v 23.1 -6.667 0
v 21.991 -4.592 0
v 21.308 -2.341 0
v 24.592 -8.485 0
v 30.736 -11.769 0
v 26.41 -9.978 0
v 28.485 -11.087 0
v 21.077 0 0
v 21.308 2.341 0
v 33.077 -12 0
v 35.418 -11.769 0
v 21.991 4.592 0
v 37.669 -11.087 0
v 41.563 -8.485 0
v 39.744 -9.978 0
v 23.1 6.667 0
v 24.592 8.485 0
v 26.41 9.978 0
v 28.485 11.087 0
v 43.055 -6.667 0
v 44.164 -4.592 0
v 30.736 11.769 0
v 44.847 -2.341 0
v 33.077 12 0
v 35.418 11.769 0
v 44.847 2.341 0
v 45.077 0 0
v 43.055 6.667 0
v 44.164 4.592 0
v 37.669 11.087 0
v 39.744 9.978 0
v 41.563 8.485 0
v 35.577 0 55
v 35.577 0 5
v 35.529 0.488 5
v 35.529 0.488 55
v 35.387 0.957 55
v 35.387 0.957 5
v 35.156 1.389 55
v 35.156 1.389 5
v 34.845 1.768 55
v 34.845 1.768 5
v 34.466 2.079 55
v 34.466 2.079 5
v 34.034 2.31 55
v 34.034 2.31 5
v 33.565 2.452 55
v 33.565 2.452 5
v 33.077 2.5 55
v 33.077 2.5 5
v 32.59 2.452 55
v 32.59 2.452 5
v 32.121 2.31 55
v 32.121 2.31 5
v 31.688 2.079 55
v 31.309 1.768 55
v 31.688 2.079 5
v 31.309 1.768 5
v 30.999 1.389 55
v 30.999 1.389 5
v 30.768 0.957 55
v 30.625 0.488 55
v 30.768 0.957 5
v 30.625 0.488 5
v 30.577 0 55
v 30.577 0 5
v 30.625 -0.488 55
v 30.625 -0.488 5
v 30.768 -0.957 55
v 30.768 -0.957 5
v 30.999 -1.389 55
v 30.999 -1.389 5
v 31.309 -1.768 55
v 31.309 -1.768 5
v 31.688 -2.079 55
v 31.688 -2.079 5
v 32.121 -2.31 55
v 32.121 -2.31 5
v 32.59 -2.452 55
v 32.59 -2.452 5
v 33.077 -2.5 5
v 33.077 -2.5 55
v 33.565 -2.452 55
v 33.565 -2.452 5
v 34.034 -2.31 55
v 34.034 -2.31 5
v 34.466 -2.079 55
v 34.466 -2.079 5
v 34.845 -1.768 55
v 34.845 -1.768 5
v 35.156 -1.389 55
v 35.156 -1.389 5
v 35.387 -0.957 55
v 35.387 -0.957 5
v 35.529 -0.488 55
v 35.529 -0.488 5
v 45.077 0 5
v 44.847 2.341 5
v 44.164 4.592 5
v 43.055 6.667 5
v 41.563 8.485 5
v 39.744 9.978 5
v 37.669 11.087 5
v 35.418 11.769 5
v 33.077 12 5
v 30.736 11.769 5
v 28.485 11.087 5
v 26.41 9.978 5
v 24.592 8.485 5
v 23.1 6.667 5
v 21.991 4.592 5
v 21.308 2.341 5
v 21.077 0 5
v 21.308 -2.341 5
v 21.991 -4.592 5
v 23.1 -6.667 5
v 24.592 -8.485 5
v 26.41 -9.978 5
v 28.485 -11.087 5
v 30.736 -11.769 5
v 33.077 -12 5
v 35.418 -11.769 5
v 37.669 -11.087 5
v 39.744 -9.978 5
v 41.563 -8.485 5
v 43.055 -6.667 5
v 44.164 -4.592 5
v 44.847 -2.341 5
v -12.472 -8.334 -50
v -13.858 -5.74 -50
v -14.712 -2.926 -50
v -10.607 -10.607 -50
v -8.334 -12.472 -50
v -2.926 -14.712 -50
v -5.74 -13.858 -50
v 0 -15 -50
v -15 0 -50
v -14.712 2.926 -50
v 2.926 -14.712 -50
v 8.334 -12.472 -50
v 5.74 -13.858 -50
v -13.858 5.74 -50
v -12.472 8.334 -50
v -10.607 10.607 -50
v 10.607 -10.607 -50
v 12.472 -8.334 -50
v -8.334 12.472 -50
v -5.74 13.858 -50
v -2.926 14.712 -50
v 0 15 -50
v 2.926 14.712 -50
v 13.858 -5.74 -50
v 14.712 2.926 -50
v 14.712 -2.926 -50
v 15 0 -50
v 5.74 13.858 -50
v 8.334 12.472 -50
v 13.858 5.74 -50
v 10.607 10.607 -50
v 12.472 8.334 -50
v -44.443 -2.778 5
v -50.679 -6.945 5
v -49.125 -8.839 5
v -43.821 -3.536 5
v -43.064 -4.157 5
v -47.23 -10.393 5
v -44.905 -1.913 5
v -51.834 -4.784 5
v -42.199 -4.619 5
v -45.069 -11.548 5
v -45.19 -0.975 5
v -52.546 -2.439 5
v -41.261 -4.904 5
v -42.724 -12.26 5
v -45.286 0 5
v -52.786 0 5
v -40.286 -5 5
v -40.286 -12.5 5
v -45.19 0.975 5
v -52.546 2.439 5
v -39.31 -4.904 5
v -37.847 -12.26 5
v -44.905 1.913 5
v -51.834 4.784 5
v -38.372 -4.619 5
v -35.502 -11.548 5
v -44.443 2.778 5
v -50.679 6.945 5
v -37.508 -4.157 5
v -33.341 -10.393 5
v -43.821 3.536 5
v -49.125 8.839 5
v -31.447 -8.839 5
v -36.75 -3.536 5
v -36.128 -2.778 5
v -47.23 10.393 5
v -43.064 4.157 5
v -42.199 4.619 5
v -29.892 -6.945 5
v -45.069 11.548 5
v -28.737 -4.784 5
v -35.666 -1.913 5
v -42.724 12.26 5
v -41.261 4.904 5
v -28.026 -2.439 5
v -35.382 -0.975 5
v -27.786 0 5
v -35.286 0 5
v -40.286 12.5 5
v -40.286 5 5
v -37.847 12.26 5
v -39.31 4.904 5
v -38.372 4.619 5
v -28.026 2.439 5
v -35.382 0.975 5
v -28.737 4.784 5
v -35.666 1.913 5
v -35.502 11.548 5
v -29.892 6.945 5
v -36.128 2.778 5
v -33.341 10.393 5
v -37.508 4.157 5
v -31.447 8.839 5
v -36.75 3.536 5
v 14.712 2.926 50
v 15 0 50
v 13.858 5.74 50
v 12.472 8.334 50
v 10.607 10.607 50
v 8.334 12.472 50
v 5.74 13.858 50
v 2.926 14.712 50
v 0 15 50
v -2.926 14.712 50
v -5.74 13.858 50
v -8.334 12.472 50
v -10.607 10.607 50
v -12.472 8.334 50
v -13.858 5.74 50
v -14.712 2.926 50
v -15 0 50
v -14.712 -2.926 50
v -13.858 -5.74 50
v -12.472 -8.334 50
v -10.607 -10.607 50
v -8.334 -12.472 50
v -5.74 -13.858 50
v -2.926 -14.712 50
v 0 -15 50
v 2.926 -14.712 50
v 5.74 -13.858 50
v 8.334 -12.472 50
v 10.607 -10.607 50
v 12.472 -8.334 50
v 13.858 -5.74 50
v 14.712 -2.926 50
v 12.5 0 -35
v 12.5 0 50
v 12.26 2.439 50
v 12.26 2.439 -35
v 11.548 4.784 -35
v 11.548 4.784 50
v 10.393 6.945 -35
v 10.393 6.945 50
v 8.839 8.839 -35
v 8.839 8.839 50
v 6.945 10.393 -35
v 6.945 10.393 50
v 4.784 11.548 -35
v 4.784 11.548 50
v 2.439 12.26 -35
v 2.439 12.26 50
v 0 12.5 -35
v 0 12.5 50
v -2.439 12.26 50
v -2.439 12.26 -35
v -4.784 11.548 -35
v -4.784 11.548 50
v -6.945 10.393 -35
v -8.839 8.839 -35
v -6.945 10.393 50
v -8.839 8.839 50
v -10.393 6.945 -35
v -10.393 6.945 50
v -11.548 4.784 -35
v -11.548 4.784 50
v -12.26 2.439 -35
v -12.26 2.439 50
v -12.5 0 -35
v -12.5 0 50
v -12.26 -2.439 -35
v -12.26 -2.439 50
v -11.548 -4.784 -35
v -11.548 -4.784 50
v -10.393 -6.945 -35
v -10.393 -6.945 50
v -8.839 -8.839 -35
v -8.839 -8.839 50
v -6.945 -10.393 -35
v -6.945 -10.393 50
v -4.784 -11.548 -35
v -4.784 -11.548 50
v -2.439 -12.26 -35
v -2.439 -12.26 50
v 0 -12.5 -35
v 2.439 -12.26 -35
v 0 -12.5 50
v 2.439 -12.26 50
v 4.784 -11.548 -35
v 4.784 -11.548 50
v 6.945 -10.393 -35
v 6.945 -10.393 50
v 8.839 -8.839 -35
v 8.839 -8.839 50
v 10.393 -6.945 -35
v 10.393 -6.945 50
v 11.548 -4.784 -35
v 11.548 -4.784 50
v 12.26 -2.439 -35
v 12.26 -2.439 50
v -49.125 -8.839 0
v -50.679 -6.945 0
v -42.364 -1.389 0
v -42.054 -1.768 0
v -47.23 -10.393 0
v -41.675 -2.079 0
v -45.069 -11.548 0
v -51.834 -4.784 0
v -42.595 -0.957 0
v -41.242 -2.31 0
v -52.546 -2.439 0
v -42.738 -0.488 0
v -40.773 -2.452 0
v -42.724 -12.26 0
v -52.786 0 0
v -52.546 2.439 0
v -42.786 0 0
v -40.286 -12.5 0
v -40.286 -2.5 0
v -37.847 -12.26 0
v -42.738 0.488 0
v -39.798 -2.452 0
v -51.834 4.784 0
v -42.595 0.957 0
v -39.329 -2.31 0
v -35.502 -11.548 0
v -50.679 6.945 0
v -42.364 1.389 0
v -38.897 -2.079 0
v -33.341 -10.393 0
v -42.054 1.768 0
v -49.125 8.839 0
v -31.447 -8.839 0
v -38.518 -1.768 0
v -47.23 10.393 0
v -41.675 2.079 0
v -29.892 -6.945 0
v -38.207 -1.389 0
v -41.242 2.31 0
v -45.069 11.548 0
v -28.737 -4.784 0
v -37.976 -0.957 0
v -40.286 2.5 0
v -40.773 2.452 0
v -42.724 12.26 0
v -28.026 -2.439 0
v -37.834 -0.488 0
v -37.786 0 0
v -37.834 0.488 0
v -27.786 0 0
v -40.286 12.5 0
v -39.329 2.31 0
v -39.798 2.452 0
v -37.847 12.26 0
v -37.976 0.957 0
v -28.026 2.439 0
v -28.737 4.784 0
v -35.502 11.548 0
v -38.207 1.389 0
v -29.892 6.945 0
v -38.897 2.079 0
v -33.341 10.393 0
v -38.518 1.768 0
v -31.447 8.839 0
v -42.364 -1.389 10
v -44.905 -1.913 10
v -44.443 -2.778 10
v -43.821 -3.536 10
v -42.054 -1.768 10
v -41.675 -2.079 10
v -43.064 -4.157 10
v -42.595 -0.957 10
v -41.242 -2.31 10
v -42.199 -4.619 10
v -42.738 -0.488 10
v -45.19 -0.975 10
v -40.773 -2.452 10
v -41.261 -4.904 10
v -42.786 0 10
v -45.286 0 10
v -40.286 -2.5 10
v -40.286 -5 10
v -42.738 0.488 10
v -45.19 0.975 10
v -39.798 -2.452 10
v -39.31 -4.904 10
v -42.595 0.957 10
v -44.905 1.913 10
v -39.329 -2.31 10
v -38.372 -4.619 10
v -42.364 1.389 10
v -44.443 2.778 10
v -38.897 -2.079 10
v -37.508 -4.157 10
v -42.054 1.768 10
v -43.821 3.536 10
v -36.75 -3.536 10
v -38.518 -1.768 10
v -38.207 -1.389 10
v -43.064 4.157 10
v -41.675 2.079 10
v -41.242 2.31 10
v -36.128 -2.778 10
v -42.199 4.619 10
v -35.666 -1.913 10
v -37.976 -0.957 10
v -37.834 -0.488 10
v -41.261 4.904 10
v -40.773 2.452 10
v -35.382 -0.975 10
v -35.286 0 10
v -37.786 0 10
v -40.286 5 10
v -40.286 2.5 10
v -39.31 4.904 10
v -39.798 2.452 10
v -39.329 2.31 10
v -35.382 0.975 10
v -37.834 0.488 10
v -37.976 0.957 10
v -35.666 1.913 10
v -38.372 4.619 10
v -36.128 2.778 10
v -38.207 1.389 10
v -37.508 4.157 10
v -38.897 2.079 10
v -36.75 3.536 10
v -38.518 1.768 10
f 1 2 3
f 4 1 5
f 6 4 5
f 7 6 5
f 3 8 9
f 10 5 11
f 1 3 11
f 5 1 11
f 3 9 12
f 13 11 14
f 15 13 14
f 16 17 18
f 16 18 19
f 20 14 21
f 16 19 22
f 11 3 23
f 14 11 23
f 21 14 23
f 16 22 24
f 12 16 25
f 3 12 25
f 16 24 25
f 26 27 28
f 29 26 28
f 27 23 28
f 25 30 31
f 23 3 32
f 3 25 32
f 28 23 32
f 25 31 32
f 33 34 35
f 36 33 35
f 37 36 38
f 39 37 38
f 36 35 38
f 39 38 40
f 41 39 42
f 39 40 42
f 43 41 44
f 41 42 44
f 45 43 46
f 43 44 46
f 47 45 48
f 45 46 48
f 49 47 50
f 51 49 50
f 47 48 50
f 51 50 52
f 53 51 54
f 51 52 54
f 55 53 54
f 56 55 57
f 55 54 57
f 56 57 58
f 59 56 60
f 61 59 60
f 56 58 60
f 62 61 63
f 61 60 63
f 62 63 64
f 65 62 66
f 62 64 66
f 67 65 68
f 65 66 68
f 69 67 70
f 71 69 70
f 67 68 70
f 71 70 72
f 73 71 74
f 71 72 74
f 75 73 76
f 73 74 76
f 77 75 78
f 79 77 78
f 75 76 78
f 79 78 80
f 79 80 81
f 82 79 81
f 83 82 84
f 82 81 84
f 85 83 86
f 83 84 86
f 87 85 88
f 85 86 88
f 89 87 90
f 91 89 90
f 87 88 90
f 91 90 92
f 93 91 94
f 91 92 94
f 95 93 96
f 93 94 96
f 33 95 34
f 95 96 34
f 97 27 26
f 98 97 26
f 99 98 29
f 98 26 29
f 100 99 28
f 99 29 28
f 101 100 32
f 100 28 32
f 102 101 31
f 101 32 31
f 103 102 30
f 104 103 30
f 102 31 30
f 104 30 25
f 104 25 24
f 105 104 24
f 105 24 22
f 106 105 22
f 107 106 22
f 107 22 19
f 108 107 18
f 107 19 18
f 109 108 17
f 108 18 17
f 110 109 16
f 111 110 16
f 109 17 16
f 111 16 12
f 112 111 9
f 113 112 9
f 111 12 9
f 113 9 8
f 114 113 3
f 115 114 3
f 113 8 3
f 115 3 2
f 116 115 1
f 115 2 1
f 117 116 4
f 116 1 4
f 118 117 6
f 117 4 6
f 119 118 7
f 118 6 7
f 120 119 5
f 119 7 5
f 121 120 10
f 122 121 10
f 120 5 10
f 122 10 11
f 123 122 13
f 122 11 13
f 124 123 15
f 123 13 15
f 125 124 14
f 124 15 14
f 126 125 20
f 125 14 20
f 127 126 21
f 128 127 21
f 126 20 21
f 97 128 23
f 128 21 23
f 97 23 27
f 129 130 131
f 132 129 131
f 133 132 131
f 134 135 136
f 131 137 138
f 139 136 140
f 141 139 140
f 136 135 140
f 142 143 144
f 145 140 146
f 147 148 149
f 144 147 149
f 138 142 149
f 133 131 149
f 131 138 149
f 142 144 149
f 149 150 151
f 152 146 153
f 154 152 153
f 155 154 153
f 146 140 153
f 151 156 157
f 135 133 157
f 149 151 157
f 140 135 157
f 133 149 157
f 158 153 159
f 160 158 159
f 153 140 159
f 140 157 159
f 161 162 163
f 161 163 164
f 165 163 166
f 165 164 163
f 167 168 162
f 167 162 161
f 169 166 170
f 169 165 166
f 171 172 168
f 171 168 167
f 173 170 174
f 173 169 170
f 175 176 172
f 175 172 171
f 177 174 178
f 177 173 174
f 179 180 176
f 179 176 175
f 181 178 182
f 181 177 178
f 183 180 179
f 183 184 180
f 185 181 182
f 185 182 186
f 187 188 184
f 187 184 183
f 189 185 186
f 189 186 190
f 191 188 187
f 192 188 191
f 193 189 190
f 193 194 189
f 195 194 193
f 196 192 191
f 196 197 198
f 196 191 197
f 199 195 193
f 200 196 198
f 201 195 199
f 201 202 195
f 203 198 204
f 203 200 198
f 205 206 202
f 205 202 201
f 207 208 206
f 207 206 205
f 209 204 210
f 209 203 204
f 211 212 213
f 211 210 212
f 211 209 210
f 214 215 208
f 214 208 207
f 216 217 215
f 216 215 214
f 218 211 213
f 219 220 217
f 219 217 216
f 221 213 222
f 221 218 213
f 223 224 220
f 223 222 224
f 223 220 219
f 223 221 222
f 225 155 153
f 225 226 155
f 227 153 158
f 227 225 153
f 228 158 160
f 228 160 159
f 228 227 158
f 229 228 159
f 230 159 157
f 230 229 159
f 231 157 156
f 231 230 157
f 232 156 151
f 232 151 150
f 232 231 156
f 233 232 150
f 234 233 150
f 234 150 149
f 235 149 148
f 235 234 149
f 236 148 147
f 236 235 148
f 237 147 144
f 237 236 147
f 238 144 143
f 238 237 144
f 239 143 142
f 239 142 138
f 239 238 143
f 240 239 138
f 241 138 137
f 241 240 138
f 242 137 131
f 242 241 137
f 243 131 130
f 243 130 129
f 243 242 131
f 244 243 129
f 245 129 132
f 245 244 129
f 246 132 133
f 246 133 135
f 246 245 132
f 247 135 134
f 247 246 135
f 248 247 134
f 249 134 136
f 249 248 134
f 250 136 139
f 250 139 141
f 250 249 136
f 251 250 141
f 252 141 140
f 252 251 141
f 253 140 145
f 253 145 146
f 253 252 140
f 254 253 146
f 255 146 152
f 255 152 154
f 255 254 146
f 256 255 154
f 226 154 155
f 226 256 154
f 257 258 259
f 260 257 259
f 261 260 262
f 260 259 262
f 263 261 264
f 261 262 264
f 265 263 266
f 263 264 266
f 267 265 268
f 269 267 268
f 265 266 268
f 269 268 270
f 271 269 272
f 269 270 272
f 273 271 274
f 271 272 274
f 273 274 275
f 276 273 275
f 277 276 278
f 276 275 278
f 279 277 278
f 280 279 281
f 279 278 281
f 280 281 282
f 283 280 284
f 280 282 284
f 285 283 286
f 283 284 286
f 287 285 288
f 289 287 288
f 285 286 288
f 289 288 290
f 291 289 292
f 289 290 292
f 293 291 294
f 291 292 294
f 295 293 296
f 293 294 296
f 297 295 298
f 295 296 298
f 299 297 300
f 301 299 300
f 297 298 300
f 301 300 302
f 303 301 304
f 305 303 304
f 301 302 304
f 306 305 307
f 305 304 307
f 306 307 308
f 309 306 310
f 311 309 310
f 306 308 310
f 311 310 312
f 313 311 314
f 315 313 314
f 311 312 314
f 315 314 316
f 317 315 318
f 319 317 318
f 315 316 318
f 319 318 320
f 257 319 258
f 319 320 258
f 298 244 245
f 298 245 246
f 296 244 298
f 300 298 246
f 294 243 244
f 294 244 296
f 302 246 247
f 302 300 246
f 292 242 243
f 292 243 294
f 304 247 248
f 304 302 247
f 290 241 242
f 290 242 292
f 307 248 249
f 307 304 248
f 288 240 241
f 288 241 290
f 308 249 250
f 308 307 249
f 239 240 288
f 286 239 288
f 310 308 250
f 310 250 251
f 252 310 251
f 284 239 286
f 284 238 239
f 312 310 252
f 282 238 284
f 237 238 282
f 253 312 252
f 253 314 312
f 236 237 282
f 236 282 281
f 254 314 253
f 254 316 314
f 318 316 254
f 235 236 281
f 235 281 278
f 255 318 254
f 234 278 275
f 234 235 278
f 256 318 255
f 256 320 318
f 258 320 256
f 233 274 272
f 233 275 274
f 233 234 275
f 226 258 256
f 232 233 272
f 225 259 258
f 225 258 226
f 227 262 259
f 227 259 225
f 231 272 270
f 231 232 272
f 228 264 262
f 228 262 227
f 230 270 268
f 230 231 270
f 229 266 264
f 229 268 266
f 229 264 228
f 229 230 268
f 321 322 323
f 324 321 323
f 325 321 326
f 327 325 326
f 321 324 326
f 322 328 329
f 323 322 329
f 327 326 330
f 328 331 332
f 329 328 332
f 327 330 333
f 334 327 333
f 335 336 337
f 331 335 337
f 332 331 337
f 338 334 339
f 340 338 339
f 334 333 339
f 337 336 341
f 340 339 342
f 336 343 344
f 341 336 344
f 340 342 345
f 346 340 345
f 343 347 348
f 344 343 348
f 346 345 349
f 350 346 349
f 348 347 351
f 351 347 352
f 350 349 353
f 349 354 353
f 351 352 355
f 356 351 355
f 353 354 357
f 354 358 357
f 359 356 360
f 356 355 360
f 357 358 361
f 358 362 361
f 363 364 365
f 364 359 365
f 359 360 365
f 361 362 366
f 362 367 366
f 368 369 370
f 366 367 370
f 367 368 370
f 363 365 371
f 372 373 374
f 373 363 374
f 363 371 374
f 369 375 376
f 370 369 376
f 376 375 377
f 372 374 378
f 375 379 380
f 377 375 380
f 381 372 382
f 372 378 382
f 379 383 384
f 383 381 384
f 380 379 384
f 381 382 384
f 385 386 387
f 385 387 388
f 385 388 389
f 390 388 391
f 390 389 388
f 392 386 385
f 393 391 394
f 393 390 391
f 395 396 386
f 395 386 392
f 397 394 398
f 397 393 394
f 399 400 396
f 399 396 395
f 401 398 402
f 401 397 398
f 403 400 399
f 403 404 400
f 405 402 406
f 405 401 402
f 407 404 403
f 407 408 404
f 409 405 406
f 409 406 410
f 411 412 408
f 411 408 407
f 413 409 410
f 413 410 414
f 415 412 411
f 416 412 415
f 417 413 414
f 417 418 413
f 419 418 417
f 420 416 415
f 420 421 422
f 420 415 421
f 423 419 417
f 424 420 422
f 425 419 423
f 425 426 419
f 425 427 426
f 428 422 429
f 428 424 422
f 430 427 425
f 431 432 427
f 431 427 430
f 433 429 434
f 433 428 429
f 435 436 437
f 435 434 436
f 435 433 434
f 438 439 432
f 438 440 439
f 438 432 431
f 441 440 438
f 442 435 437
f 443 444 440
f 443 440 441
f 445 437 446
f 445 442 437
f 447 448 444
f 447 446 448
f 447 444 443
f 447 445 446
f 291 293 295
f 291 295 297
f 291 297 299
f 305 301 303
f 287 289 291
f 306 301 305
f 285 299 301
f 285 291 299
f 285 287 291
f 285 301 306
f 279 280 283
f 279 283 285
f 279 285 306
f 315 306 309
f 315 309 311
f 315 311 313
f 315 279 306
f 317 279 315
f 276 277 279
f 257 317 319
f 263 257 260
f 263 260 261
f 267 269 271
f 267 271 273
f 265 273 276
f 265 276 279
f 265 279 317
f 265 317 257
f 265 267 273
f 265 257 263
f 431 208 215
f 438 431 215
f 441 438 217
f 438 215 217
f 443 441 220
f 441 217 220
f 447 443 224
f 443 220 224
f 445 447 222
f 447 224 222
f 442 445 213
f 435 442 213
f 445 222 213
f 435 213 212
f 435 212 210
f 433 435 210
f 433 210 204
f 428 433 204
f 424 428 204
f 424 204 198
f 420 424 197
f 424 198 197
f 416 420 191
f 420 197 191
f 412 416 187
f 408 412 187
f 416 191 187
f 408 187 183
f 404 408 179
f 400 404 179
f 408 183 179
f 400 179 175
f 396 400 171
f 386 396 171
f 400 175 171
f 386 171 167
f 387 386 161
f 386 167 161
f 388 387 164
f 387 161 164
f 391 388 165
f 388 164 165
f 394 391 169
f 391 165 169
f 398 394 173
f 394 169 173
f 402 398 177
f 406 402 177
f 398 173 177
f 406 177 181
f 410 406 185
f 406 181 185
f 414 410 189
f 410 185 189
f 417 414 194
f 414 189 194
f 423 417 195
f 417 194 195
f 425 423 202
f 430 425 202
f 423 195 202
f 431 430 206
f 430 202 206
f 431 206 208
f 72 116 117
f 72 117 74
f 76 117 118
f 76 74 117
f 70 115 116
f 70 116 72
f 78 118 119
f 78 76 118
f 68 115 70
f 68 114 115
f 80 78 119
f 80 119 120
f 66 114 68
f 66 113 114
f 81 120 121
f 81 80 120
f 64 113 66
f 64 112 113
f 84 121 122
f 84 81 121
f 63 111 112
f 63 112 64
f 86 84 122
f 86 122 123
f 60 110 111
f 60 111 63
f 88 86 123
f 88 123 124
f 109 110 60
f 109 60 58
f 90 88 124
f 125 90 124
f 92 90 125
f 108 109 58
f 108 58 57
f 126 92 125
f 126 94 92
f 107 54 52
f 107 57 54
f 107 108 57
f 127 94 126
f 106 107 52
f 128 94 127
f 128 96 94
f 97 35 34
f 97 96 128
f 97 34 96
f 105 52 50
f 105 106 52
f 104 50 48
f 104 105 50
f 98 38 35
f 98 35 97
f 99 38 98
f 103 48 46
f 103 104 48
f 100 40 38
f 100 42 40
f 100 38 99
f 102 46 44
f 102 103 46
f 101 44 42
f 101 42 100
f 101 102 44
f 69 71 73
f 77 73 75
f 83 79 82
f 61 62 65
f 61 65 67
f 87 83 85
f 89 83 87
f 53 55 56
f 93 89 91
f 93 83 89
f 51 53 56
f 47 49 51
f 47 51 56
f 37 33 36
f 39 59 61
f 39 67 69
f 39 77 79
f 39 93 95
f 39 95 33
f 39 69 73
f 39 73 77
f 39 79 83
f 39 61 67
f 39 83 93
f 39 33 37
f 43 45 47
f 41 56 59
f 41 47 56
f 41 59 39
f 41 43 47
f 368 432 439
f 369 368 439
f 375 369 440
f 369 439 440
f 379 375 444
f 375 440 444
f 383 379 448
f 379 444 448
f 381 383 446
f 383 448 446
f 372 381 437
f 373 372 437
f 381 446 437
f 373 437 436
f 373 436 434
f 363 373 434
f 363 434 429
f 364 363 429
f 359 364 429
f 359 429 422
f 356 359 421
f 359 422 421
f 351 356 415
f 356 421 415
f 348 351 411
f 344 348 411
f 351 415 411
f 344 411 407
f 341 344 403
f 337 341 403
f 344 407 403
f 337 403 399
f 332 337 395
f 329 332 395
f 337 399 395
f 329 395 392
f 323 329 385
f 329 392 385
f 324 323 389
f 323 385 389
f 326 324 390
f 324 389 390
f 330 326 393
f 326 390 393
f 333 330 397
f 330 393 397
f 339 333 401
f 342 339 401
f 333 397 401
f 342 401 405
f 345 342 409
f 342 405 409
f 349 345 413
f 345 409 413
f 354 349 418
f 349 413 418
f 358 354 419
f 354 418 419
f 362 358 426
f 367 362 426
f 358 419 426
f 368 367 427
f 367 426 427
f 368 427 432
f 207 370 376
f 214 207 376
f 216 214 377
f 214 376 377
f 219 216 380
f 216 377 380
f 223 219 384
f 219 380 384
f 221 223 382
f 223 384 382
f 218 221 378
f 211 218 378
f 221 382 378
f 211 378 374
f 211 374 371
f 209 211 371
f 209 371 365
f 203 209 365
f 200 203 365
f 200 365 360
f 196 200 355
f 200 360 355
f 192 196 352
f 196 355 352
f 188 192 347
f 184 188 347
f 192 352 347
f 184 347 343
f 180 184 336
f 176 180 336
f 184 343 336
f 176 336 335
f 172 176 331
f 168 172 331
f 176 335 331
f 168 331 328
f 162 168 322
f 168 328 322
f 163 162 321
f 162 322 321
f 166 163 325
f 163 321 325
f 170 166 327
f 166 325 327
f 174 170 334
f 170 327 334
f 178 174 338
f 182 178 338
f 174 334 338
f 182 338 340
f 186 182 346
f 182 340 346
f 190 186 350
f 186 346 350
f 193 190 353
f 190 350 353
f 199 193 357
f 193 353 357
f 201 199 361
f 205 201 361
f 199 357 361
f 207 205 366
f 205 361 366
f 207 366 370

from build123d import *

# Parameters (mm, degrees)
F0_R      = 15
F1_DEPTH  = 50
F2_R      = 12.5
F3_DEPTH  = 85
F4_R      = 12
F5_DEPTH  = 5
F6_R      = 2.5
F7_DEPTH  = 50
F8_R      = 12.5
F9_DEPTH  = 5
F10_R     = 5
F11_DEPTH = 5
F12_R     = 2.5
F13_DEPTH = 10


with BuildPart() as f1:
    # F0 (on Top) → F1 (new body, symmetric)
    with BuildSketch(Plane.XY):
        Circle(F0_R)
    extrude(amount=F1_DEPTH, both=True)

    # F2 (on face) → F3 (cut)
    with BuildSketch(Plane.XY.offset(50)):
        Circle(F2_R)
    extrude(amount=-F3_DEPTH, mode=Mode.SUBTRACT)


with BuildPart() as f5:
    # F4 (on Top) → F5 (new body)
    with BuildSketch(Plane.XY):
        with Locations((33.077261, 0)):
            Circle(F4_R)
    extrude(amount=F5_DEPTH)

    # F6 (on face) → F7 (join)
    with BuildSketch(Plane.XY.offset(5)):
        with Locations((33.077261, 0)):
            Circle(F6_R)
    extrude(amount=F7_DEPTH)


with BuildPart() as f9:
    # F8 (on Top) → F9 (new body)
    with BuildSketch(Plane.XY):
        with Locations((-40.28576, 0)):
            Circle(F8_R)
    extrude(amount=F9_DEPTH)

    # F10 (on face) → F11 (join)
    with BuildSketch(Plane.XY.offset(5)):
        with Locations((-40.28576, 0)):
            Circle(F10_R)
    extrude(amount=F11_DEPTH)

    # F12 (on face) → F13 (cut)
    with BuildSketch(Plane.XY.offset(10)):
        with Locations((-40.28576, 0)):
            Circle(F12_R)
    extrude(amount=-F13_DEPTH, mode=Mode.SUBTRACT)


solid = Compound([f1.part, f5.part, f9.part])
